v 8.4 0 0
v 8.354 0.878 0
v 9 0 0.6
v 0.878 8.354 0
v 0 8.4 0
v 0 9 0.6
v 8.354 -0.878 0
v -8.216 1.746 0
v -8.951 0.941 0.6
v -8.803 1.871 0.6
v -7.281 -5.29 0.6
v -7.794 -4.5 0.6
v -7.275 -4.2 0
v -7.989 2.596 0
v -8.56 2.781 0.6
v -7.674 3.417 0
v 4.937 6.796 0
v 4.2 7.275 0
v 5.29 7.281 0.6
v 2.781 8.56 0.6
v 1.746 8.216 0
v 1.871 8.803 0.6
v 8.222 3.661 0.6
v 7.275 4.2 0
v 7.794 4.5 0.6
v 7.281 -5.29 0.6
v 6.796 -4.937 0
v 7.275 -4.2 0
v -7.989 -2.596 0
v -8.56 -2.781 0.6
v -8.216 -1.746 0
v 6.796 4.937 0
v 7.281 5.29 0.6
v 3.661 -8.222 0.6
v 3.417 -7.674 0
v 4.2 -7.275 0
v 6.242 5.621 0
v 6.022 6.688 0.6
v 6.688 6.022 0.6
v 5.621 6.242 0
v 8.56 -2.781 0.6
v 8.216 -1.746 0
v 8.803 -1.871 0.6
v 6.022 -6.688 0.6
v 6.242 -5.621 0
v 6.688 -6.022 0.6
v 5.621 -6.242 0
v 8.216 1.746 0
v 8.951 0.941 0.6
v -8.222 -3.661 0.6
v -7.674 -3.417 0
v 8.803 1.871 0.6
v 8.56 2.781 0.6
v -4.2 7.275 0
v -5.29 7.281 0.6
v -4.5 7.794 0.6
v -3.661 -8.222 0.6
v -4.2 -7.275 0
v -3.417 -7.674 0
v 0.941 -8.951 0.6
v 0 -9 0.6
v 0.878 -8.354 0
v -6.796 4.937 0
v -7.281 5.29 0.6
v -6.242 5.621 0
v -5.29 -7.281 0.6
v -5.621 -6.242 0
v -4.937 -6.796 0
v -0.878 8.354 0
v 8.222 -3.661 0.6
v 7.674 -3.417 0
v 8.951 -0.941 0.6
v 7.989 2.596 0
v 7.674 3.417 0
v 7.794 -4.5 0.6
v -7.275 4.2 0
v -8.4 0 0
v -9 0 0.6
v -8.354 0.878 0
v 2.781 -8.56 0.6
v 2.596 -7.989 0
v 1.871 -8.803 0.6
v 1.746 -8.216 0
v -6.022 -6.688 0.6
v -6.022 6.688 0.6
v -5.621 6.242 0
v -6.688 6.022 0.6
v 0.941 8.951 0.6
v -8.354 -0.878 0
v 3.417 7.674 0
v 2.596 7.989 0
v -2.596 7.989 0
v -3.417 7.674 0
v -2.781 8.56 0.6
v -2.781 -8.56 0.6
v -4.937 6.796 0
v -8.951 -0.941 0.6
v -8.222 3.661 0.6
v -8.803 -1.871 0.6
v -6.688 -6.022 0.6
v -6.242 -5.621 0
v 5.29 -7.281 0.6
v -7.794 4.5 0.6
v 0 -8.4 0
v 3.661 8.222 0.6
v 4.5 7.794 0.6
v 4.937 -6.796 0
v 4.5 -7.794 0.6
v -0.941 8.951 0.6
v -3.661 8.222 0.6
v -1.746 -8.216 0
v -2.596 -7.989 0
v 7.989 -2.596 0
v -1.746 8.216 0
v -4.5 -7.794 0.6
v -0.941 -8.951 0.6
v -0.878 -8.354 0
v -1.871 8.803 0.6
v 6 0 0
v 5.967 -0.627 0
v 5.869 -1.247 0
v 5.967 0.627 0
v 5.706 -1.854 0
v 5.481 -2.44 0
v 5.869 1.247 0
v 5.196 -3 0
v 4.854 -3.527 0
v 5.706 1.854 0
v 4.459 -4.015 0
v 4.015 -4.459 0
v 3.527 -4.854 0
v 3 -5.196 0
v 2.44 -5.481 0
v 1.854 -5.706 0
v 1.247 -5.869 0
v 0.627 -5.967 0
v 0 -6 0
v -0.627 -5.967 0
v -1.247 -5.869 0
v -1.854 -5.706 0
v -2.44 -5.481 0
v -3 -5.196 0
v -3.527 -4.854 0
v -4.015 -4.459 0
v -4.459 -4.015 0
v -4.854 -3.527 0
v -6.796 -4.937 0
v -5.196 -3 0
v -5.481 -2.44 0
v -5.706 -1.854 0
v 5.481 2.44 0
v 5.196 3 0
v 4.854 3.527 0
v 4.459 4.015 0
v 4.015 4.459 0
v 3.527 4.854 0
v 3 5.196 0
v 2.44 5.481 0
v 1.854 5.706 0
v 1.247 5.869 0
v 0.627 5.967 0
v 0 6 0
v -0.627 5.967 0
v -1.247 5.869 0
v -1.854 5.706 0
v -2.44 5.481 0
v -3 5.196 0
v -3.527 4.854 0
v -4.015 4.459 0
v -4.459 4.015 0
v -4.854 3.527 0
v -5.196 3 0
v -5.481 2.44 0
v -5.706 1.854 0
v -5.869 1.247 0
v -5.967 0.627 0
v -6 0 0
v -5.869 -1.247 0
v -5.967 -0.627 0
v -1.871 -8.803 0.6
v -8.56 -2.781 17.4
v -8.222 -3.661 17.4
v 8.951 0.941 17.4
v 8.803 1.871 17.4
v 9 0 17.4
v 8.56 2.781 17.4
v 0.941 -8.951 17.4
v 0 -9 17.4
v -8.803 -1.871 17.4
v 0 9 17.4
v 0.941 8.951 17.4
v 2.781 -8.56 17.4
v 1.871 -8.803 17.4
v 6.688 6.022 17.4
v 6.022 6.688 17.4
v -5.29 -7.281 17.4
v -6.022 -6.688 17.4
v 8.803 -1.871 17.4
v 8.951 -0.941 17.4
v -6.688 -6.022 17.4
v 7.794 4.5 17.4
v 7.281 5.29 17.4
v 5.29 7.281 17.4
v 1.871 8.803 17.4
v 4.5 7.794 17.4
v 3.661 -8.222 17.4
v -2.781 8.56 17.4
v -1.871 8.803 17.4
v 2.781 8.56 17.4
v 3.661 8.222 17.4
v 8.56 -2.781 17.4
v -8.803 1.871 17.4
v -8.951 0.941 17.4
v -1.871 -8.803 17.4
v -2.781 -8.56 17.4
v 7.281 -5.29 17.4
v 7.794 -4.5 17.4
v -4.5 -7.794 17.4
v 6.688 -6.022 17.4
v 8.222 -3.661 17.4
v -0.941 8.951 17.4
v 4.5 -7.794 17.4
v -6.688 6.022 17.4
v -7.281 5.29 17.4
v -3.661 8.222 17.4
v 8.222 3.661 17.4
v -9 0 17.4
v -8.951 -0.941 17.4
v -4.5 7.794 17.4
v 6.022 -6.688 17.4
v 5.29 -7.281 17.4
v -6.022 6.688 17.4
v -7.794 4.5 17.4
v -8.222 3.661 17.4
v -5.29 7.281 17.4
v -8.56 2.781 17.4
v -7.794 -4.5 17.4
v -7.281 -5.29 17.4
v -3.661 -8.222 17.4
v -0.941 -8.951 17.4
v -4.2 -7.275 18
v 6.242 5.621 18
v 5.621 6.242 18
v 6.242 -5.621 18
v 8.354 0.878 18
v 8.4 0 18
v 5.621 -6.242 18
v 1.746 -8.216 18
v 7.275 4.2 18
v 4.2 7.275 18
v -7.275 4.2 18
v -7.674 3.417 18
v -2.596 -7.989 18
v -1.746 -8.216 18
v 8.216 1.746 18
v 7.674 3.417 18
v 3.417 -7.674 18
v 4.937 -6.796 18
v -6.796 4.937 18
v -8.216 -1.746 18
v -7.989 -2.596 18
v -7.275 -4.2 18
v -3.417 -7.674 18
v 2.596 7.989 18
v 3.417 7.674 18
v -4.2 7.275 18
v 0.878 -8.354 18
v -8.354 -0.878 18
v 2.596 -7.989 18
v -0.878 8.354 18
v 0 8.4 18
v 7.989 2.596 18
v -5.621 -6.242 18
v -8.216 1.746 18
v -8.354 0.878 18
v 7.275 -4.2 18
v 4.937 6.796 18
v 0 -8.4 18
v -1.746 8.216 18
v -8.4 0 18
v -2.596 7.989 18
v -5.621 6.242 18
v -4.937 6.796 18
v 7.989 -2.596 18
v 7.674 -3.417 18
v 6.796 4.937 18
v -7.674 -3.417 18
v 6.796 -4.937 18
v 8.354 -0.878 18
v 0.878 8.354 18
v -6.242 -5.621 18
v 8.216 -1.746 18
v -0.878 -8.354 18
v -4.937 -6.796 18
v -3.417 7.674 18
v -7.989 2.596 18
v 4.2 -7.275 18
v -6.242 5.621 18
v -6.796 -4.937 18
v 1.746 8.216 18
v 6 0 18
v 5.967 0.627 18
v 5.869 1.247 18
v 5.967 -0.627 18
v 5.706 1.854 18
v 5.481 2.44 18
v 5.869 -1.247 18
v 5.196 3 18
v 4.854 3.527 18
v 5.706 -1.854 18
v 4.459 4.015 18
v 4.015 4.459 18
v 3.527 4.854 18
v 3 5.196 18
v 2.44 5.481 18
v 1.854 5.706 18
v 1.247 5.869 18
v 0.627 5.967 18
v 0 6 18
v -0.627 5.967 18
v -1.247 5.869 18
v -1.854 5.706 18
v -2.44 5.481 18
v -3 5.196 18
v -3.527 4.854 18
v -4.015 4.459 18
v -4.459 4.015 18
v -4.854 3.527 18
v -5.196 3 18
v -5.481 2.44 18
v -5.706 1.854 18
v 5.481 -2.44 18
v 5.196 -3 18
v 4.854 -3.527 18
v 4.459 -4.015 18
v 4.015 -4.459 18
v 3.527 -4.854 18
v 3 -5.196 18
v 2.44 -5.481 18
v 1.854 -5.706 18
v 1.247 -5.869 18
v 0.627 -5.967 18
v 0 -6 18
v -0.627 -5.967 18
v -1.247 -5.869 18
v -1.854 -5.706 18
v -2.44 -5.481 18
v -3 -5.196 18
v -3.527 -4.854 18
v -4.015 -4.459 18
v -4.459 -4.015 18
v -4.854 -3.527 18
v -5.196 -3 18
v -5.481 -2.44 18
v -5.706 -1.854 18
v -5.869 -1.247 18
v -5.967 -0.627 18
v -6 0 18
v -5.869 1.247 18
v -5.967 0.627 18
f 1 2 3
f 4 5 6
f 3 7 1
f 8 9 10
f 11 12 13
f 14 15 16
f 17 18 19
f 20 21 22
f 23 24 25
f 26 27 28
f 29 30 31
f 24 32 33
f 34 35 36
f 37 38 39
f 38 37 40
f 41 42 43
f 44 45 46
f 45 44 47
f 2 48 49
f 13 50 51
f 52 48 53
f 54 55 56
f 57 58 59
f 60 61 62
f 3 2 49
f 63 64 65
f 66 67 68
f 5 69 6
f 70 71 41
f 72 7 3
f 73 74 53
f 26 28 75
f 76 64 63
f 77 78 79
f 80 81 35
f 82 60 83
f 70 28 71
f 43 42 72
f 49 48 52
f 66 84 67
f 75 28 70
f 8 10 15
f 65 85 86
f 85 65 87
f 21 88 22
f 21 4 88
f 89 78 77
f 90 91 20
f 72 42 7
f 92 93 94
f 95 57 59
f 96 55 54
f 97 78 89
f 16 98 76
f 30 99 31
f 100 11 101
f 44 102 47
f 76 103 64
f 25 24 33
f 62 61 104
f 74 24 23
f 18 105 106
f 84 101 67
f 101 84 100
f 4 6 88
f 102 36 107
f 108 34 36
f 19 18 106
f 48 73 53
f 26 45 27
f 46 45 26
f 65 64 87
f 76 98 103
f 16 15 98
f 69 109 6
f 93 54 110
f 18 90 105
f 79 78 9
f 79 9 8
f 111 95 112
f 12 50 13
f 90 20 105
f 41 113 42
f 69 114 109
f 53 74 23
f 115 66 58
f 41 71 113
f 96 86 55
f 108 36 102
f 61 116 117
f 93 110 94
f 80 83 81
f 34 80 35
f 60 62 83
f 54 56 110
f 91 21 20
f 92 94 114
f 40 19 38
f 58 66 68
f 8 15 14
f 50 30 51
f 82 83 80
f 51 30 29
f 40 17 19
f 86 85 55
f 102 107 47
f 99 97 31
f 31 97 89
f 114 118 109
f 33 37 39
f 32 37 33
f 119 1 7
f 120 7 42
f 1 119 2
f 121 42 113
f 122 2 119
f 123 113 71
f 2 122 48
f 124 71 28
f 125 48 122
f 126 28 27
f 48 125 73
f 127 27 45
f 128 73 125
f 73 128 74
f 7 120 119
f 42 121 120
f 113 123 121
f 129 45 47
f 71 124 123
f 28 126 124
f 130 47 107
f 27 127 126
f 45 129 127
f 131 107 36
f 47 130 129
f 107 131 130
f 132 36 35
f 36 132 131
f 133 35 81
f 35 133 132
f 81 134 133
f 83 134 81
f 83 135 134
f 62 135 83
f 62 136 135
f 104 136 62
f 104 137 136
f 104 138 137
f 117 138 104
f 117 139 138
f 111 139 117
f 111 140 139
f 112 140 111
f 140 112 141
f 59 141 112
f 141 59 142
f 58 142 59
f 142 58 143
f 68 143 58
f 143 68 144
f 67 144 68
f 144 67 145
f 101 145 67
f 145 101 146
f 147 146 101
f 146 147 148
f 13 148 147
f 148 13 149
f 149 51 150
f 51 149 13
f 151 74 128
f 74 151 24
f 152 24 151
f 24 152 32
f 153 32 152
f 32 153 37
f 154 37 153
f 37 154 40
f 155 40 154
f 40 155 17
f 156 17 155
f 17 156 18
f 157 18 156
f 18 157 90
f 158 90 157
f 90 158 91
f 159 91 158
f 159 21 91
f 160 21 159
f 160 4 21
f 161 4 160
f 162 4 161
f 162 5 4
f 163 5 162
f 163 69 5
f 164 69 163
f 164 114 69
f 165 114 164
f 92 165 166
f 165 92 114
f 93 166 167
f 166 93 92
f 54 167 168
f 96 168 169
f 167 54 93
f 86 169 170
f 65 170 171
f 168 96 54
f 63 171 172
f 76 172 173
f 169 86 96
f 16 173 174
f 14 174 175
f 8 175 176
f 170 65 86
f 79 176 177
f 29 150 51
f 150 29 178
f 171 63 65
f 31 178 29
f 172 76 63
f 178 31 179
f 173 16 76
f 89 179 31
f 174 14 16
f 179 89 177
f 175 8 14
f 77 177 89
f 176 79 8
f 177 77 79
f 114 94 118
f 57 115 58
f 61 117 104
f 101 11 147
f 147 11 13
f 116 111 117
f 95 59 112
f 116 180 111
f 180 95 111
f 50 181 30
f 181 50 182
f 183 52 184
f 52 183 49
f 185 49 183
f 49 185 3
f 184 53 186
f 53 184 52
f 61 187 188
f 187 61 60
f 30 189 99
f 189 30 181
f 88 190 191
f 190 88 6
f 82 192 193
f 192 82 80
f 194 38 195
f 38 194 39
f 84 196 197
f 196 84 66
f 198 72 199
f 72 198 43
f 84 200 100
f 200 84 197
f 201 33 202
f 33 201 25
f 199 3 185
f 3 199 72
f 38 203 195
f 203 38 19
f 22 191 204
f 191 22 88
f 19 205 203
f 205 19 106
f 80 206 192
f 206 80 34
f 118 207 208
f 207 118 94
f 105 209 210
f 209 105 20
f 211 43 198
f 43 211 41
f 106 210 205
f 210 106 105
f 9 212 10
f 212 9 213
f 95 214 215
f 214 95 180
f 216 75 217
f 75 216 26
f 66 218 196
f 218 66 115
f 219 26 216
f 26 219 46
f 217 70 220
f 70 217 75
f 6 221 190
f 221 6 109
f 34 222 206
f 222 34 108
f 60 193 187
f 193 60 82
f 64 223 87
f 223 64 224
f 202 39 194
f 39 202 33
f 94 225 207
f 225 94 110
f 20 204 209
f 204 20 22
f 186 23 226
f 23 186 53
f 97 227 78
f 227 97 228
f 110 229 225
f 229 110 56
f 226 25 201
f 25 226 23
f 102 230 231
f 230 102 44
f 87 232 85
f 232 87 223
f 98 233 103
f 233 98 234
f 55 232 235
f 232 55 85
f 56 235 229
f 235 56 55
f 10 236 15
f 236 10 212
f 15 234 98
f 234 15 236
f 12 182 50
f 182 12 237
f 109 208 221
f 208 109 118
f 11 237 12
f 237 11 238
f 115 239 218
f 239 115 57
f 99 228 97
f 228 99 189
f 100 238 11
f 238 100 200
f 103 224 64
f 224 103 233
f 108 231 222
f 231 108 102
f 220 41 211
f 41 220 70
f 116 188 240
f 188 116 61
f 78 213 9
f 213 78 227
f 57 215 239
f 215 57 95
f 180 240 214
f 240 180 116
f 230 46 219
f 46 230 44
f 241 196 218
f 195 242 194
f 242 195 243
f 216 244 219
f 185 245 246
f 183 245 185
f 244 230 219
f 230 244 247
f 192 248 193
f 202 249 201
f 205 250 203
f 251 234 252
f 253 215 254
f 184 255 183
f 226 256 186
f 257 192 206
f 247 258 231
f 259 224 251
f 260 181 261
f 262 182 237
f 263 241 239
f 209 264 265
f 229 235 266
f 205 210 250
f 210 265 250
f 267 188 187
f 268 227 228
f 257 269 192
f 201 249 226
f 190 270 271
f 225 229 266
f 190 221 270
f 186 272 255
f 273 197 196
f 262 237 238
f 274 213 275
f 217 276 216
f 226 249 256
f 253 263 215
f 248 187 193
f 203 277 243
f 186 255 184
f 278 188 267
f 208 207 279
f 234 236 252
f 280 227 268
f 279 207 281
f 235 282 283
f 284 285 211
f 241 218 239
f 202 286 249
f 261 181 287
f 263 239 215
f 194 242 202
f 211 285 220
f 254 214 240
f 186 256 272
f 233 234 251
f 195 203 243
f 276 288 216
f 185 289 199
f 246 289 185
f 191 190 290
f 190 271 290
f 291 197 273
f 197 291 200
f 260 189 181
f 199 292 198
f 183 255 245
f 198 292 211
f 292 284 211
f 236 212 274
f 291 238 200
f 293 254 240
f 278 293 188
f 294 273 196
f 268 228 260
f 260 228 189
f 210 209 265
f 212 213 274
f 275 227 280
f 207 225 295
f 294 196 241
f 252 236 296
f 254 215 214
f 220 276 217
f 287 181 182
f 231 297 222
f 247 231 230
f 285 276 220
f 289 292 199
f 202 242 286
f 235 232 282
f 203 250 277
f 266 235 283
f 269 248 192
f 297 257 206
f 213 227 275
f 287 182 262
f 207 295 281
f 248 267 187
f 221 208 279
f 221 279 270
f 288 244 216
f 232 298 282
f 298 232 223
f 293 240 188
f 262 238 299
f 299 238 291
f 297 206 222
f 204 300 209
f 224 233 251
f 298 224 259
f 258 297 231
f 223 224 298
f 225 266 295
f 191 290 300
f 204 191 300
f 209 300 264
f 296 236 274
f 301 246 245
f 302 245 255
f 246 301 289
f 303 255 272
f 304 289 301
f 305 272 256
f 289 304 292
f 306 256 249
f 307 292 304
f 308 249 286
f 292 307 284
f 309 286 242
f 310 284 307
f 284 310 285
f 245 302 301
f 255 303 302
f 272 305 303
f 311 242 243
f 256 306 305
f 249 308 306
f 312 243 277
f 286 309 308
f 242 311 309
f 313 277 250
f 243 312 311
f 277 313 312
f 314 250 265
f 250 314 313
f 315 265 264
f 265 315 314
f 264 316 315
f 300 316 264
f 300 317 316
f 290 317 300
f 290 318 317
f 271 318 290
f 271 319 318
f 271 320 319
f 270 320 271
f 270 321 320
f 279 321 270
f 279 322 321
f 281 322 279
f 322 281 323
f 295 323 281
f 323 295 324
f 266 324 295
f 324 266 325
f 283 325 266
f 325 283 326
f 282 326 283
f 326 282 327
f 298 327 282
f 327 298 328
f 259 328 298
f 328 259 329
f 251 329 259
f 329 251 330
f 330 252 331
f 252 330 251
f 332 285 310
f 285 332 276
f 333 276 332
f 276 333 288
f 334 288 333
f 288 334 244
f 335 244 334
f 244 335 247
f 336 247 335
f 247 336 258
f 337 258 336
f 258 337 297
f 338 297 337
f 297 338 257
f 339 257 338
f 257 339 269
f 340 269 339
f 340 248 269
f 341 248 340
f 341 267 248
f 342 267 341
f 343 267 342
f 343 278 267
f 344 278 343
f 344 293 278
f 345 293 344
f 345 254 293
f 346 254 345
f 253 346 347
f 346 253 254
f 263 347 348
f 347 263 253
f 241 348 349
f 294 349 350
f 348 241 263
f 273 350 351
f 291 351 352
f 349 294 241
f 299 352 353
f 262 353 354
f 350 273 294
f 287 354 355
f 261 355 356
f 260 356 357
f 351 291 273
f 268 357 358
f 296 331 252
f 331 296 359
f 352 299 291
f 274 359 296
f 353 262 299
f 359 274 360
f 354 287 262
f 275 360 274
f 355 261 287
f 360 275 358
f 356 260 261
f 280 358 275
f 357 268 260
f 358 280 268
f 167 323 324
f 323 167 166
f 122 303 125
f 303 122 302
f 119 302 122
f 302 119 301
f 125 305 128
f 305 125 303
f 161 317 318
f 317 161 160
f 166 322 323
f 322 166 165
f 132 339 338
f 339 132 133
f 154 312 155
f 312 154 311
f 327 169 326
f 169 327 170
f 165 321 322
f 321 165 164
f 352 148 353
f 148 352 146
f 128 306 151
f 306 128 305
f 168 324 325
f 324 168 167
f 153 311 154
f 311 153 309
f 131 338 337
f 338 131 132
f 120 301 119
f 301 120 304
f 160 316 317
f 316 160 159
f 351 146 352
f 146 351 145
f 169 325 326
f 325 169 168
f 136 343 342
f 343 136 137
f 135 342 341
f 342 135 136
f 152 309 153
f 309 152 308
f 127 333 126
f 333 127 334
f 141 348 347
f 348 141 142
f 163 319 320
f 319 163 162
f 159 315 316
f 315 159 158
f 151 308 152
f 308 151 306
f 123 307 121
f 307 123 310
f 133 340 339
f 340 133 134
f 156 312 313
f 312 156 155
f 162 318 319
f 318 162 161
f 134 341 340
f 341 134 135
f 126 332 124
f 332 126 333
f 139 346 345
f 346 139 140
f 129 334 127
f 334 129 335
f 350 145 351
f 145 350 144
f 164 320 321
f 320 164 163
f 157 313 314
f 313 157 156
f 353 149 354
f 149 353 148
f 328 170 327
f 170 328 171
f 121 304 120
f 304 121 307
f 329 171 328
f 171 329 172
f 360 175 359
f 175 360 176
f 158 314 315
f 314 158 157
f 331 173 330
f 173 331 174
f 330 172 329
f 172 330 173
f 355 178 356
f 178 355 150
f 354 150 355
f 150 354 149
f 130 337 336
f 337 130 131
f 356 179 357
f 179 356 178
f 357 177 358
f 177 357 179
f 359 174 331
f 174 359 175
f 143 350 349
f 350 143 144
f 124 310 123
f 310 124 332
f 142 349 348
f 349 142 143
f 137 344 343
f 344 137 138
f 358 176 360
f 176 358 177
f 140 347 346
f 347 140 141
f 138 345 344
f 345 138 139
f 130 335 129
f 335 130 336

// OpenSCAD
// Plain sleeve bushing.
$fn = 60;
eps = 0.02;
inner_d = 12;
outer_d = 18;
length = 18;
chamfer = 0.6;
difference() {
    union() {
        cylinder(d1 = outer_d - 2 * chamfer, d2 = outer_d, h = chamfer);
        translate([0, 0, chamfer]) cylinder(d = outer_d, h = length - 2 * chamfer);
        translate([0, 0, length - chamfer]) cylinder(d1 = outer_d, d2 = outer_d - 2 * chamfer, h = chamfer);
    }
    translate([0, 0, -eps]) cylinder(d = inner_d, h = length + 2 * eps);
}
